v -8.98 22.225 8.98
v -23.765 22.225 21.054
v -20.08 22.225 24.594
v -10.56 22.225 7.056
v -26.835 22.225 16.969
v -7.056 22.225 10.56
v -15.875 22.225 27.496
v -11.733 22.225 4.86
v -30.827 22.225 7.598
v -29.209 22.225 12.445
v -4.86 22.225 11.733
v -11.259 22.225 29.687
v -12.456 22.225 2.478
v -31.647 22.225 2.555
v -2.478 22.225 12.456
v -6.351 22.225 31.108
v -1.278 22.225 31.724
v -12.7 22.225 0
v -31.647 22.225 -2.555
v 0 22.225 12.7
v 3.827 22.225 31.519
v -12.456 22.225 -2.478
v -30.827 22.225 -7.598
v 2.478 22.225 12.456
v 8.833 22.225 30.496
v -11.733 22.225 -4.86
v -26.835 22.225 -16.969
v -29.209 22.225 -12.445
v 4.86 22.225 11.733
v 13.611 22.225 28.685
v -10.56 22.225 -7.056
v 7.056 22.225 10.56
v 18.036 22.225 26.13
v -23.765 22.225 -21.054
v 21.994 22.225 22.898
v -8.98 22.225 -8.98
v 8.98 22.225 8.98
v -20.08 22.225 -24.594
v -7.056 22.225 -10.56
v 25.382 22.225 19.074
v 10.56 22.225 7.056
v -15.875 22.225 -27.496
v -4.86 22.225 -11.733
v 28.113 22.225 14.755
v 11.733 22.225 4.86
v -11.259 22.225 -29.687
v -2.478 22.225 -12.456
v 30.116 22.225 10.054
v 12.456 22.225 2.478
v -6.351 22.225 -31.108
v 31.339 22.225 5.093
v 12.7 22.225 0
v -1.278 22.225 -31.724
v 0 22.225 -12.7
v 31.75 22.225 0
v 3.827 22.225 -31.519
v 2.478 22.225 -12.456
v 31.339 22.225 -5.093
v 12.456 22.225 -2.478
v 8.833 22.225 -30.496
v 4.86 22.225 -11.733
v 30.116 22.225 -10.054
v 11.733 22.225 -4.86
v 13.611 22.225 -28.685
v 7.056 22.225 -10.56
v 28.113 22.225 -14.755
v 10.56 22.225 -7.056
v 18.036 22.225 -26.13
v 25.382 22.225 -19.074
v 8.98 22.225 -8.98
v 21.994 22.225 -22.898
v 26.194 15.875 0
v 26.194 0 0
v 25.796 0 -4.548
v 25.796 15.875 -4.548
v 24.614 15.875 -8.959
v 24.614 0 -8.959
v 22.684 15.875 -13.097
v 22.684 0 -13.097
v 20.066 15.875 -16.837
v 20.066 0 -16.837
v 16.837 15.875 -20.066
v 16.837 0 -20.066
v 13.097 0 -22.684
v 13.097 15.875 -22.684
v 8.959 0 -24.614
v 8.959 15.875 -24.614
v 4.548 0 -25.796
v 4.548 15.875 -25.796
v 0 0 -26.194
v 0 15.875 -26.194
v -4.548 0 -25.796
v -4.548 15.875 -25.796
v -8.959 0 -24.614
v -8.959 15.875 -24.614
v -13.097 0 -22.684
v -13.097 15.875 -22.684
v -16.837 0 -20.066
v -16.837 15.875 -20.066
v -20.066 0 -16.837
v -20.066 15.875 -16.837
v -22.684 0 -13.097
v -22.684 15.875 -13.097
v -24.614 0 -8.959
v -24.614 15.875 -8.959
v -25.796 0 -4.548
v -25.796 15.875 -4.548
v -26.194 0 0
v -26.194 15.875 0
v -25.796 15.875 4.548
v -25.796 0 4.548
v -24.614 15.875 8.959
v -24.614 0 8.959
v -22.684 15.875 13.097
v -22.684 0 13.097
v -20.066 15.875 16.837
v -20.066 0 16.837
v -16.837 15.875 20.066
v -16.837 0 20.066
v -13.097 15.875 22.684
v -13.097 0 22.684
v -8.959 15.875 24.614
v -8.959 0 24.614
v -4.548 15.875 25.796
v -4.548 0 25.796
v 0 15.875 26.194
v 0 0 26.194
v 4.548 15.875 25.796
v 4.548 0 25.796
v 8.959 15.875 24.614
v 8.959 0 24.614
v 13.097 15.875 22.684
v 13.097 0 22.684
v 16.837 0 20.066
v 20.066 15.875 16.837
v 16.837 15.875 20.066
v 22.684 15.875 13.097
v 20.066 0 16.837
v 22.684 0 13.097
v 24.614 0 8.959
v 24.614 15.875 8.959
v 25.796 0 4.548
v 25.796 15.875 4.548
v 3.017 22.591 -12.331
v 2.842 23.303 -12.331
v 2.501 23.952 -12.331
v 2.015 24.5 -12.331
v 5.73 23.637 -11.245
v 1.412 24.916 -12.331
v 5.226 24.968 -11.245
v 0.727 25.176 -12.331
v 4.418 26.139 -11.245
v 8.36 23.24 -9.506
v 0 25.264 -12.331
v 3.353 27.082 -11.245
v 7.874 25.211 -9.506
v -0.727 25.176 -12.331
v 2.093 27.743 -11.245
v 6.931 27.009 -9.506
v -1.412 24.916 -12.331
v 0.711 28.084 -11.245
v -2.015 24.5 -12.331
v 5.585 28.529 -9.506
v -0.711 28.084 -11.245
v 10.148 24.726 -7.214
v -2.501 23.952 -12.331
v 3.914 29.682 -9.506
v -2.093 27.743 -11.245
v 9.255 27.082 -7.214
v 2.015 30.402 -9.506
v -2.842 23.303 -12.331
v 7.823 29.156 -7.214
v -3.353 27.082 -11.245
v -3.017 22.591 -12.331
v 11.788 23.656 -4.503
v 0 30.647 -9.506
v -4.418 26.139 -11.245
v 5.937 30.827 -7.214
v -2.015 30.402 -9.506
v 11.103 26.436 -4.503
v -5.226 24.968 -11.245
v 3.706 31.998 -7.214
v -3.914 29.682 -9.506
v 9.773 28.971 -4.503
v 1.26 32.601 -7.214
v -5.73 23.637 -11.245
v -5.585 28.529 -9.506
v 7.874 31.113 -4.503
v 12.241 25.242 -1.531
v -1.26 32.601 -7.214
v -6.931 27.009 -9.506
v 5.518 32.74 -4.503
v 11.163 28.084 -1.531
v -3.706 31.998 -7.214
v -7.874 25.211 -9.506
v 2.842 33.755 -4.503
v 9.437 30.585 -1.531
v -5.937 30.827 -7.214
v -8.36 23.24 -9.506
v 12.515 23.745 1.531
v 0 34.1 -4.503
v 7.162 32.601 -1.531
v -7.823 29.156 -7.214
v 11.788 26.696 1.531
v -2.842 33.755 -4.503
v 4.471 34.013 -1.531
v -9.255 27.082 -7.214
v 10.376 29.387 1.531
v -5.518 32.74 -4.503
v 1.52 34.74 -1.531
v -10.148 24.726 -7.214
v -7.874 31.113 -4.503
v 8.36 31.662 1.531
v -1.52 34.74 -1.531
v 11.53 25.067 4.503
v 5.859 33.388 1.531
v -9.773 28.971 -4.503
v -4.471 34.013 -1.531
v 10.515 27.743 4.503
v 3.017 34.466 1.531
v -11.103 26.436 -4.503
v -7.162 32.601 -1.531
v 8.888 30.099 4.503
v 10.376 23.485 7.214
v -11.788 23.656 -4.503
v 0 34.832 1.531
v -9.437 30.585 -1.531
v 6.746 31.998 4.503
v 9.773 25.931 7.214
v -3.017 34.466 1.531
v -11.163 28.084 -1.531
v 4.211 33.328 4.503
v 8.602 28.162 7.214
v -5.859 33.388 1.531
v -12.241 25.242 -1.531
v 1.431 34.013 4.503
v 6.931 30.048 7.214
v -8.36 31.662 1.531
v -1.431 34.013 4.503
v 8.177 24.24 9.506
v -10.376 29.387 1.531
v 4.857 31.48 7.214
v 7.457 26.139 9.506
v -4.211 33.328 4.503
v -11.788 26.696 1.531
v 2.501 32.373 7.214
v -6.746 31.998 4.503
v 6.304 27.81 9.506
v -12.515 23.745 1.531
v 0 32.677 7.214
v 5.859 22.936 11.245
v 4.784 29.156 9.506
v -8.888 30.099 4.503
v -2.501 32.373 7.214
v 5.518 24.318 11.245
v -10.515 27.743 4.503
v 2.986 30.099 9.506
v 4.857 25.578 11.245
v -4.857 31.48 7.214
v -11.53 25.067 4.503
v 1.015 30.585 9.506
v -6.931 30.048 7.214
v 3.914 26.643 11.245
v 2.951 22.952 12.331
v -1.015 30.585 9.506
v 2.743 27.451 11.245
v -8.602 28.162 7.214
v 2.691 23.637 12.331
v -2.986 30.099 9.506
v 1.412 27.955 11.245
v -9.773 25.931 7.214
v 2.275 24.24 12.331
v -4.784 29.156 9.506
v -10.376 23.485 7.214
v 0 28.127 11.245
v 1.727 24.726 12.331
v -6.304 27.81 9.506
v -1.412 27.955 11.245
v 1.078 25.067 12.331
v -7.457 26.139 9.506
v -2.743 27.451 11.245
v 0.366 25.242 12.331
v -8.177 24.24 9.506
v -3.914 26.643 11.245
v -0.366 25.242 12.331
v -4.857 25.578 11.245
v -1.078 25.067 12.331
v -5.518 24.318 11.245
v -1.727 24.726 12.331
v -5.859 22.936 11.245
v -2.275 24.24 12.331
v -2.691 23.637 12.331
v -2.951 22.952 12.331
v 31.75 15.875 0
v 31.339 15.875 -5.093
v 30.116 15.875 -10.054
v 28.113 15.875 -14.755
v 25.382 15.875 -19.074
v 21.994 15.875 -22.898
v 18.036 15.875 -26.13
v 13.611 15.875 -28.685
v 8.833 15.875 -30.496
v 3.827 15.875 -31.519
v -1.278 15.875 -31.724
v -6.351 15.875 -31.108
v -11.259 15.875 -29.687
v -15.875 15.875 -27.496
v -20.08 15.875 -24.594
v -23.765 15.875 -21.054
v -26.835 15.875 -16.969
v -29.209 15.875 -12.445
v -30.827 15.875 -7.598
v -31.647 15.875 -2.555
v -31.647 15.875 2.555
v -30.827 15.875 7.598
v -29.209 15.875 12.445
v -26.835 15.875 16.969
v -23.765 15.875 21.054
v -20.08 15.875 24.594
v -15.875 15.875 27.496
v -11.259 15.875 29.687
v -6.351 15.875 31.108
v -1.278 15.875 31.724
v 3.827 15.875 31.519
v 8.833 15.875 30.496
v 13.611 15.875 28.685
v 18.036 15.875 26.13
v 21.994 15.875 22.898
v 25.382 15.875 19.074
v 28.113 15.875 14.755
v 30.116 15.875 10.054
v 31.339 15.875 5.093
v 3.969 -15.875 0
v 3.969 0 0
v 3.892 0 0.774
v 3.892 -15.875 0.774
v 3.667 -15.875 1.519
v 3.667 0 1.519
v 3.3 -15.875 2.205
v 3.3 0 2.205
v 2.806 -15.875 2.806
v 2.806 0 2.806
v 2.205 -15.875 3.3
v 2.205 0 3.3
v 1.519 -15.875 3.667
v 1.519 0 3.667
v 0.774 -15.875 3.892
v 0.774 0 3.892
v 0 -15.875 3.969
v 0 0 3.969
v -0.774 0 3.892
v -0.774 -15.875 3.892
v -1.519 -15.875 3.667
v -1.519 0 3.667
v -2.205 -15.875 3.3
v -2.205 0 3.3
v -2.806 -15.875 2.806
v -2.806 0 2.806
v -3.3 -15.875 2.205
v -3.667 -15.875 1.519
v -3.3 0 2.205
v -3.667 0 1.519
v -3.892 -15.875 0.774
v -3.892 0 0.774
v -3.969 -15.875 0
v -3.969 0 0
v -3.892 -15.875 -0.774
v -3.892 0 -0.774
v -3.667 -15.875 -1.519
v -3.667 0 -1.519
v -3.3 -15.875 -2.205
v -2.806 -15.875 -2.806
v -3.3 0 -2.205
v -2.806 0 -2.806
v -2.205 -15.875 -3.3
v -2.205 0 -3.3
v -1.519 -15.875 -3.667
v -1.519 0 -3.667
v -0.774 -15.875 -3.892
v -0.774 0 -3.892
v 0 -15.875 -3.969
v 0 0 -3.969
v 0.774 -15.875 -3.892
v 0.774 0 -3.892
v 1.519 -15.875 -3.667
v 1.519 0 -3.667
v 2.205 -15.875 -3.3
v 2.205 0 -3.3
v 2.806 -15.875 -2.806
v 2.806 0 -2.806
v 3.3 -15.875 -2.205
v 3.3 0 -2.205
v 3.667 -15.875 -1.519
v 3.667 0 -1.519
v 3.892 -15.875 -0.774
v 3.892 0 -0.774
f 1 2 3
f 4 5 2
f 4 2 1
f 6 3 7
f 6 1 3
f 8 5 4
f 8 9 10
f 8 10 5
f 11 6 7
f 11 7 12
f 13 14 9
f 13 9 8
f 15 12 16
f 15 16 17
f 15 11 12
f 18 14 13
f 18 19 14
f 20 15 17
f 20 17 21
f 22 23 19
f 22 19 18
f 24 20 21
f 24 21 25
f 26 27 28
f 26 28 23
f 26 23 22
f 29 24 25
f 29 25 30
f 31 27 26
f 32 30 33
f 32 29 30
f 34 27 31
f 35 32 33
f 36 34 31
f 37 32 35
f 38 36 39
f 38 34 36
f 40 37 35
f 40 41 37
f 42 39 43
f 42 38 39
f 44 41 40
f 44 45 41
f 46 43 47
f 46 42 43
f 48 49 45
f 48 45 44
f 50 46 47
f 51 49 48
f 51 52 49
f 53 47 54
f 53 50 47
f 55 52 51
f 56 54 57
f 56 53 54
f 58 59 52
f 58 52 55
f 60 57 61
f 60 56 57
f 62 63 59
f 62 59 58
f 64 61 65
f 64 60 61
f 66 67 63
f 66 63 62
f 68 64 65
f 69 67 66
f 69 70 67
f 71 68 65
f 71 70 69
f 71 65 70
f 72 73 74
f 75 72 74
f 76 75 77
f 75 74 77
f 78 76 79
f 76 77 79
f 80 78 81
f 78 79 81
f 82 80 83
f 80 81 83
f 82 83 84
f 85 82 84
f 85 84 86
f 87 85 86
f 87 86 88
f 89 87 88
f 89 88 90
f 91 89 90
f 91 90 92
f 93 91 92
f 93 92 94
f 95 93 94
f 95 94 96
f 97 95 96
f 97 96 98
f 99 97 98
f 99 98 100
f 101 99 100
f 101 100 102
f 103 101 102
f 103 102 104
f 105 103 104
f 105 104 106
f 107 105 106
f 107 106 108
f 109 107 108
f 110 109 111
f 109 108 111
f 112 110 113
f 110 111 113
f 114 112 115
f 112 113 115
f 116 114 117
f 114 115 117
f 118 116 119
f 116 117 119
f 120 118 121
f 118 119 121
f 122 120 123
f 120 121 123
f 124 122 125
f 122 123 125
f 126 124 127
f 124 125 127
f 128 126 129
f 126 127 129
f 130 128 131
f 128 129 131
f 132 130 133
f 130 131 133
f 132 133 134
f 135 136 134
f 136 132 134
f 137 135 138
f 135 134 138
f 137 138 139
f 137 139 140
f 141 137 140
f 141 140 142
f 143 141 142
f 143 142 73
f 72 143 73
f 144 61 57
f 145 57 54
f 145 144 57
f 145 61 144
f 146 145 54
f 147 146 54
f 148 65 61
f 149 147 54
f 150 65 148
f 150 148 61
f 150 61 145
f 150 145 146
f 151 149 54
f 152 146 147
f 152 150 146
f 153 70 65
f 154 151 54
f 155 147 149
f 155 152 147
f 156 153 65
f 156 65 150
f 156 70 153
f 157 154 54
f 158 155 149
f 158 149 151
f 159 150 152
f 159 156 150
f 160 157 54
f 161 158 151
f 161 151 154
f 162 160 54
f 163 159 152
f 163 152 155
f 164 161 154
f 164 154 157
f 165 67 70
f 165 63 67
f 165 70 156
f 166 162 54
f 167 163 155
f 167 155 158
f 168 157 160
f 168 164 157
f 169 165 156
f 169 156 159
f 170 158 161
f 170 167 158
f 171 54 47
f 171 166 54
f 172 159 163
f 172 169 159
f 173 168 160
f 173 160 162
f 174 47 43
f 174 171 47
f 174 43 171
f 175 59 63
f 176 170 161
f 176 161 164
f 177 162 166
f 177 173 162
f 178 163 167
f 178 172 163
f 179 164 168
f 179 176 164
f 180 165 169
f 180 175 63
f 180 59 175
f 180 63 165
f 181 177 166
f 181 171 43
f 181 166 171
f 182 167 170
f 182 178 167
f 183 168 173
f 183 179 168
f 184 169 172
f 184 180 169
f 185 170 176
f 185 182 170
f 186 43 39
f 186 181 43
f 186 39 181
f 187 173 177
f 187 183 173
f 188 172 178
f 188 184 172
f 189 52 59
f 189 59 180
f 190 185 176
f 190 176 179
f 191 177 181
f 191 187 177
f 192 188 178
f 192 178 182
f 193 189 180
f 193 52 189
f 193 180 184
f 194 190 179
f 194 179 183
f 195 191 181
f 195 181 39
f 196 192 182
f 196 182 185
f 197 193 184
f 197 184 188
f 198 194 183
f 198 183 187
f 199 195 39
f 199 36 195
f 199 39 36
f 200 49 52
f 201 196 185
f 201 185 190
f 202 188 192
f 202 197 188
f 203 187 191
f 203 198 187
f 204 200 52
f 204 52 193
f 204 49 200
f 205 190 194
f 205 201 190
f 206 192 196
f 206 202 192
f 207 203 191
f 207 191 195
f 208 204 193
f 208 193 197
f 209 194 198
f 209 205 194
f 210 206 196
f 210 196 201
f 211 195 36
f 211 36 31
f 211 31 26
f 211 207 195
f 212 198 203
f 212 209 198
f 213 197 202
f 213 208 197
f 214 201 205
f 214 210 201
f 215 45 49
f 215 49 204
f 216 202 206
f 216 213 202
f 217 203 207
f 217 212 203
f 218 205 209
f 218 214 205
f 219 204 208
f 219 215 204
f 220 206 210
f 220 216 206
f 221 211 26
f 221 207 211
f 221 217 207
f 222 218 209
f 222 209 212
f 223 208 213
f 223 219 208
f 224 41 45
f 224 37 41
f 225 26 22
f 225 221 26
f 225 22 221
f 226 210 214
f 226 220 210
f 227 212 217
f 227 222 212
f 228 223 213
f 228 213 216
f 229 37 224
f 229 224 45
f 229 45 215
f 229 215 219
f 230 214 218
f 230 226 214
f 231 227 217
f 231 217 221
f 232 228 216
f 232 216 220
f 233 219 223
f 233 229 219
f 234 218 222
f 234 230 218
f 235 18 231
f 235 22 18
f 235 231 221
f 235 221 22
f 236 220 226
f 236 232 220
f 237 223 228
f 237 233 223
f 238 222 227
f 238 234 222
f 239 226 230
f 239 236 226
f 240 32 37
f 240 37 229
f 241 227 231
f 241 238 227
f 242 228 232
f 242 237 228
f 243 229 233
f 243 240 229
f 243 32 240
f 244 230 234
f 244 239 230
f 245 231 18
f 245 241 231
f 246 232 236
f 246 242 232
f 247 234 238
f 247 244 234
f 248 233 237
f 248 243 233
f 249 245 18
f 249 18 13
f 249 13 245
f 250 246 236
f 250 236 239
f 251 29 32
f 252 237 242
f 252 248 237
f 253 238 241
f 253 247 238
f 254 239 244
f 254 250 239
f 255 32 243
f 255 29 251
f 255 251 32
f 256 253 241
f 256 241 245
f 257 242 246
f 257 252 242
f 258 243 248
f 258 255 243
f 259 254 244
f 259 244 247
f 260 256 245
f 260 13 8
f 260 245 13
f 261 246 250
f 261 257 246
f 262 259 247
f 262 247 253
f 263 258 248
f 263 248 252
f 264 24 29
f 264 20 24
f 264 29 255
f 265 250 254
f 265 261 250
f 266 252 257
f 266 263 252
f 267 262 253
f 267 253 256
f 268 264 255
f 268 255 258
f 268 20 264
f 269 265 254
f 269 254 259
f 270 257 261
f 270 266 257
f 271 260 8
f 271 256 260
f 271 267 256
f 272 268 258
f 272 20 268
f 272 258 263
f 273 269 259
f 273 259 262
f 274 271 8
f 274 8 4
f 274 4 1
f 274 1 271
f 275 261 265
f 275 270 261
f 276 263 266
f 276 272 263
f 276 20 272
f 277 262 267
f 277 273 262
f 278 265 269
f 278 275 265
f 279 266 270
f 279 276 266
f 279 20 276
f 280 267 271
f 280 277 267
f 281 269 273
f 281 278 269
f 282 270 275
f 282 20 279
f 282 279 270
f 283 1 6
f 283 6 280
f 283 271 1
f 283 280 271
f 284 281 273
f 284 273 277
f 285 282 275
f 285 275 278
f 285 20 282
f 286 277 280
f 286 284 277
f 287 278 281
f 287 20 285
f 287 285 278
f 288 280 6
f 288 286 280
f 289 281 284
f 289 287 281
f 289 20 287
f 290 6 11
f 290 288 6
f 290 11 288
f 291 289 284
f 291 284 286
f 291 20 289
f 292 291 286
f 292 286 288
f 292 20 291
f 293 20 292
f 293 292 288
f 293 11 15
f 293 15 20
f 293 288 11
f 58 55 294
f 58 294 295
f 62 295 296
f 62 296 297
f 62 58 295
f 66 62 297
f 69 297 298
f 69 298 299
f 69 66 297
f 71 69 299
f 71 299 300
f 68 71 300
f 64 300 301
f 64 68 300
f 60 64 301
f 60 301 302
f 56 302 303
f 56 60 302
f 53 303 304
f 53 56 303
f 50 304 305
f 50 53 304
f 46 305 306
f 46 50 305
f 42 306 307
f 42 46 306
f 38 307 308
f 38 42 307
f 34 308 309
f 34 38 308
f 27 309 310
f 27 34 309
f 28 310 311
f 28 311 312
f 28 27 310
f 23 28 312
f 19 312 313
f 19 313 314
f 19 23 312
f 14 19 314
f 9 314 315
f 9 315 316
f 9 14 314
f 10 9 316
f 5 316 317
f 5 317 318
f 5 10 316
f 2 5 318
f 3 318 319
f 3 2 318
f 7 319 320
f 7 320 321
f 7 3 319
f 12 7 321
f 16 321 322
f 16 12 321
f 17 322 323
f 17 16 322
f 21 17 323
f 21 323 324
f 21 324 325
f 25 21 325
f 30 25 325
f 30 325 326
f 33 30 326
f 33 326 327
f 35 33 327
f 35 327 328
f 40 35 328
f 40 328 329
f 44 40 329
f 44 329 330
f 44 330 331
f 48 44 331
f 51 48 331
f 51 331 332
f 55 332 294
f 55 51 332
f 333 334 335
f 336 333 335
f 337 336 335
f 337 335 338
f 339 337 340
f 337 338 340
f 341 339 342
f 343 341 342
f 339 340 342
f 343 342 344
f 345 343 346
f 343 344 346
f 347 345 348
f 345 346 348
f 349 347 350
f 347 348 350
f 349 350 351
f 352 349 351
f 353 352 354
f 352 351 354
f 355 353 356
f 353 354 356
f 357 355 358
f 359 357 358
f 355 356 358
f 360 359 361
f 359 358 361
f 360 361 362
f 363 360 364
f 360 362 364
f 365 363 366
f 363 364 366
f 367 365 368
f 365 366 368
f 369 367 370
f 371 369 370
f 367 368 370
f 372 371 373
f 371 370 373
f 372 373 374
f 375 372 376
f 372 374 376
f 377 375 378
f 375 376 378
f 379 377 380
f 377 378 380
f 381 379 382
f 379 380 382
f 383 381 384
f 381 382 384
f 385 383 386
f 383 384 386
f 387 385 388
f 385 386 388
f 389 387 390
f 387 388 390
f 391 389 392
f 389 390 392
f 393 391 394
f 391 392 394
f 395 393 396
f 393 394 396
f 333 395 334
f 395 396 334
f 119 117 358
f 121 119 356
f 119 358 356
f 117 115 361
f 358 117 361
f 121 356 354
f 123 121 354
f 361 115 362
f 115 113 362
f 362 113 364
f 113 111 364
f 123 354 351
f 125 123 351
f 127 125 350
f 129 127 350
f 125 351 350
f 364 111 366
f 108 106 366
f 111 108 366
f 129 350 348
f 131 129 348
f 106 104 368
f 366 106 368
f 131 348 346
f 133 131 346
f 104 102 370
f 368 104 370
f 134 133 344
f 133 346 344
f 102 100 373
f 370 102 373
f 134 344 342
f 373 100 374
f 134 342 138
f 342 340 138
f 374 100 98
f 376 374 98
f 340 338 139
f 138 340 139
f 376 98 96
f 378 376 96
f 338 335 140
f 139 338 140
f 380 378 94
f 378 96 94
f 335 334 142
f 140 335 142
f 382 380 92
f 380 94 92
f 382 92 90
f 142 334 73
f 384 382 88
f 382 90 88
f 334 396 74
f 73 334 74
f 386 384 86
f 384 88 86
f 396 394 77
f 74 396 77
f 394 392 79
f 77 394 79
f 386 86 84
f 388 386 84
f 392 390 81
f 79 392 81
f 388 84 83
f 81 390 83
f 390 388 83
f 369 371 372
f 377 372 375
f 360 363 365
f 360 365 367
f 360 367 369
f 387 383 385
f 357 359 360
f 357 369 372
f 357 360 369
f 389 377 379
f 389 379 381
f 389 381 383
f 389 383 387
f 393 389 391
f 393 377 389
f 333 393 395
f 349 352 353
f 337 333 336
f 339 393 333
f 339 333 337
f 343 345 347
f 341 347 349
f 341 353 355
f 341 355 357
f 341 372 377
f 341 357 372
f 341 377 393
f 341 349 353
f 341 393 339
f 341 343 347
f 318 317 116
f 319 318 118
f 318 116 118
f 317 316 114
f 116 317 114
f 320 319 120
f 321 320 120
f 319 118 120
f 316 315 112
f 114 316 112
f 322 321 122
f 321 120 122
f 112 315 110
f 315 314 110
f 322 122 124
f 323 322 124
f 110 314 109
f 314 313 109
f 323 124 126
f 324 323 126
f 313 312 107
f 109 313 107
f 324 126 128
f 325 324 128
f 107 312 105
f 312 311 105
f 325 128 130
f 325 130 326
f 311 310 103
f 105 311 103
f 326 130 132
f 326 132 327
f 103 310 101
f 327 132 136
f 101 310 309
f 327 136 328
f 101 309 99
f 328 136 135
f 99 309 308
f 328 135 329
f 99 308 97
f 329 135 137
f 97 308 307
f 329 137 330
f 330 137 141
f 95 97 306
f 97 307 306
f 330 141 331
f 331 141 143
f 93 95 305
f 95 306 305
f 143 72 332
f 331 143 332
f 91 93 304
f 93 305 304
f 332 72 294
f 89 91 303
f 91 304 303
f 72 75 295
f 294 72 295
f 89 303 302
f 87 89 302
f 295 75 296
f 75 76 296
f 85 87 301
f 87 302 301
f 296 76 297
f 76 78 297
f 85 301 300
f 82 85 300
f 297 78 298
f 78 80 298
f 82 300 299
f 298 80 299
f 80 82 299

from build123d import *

# Parameters (mm, degrees)
SKETCH1_R           = 26.19375
BOSS_EXTRUDE1_DEPTH = 22.225
SKETCH2_R           = 31.75
BOSS_EXTRUDE2_DEPTH = 6.35
SKETCH4_R           = 3.96875
BOSS_EXTRUDE3_DEPTH = 15.875


with BuildPart() as part:
    # Sketch1 → Boss-Extrude1 (new body)
    with BuildSketch(Plane(origin=(0, 0, 0), x_dir=(1, 0, 0), z_dir=(0, 1, 0))):
        Circle(SKETCH1_R)
    extrude(amount=BOSS_EXTRUDE1_DEPTH)

    # Sketch2 → Boss-Extrude2 (add)
    with BuildSketch(Plane(origin=(0, 22.225, 0), x_dir=(1, 0, 0), z_dir=(0, 1, 0))):
        Circle(SKETCH2_R)
    extrude(amount=-BOSS_EXTRUDE2_DEPTH)

    # Sketch3 → Revolve1 (revolve)
    with BuildSketch(Plane(origin=(0, 22.225, 0), x_dir=(1, 0, 0), z_dir=(0, 1, 0))):
        with BuildLine():
            Line((0, -12.7), (0, 12.7))
            ThreePointArc((0, 12.7), (12.7, 0), (0, -12.7))
        make_face()
    revolve(axis=Axis((0, 22.225, -45.379060403), (0, 0, 1)))

    # Sketch4 → Boss-Extrude3 (add)
    with BuildSketch(Plane.XZ):
        Circle(SKETCH4_R)
    extrude(amount=BOSS_EXTRUDE3_DEPTH)


solid = part.part
